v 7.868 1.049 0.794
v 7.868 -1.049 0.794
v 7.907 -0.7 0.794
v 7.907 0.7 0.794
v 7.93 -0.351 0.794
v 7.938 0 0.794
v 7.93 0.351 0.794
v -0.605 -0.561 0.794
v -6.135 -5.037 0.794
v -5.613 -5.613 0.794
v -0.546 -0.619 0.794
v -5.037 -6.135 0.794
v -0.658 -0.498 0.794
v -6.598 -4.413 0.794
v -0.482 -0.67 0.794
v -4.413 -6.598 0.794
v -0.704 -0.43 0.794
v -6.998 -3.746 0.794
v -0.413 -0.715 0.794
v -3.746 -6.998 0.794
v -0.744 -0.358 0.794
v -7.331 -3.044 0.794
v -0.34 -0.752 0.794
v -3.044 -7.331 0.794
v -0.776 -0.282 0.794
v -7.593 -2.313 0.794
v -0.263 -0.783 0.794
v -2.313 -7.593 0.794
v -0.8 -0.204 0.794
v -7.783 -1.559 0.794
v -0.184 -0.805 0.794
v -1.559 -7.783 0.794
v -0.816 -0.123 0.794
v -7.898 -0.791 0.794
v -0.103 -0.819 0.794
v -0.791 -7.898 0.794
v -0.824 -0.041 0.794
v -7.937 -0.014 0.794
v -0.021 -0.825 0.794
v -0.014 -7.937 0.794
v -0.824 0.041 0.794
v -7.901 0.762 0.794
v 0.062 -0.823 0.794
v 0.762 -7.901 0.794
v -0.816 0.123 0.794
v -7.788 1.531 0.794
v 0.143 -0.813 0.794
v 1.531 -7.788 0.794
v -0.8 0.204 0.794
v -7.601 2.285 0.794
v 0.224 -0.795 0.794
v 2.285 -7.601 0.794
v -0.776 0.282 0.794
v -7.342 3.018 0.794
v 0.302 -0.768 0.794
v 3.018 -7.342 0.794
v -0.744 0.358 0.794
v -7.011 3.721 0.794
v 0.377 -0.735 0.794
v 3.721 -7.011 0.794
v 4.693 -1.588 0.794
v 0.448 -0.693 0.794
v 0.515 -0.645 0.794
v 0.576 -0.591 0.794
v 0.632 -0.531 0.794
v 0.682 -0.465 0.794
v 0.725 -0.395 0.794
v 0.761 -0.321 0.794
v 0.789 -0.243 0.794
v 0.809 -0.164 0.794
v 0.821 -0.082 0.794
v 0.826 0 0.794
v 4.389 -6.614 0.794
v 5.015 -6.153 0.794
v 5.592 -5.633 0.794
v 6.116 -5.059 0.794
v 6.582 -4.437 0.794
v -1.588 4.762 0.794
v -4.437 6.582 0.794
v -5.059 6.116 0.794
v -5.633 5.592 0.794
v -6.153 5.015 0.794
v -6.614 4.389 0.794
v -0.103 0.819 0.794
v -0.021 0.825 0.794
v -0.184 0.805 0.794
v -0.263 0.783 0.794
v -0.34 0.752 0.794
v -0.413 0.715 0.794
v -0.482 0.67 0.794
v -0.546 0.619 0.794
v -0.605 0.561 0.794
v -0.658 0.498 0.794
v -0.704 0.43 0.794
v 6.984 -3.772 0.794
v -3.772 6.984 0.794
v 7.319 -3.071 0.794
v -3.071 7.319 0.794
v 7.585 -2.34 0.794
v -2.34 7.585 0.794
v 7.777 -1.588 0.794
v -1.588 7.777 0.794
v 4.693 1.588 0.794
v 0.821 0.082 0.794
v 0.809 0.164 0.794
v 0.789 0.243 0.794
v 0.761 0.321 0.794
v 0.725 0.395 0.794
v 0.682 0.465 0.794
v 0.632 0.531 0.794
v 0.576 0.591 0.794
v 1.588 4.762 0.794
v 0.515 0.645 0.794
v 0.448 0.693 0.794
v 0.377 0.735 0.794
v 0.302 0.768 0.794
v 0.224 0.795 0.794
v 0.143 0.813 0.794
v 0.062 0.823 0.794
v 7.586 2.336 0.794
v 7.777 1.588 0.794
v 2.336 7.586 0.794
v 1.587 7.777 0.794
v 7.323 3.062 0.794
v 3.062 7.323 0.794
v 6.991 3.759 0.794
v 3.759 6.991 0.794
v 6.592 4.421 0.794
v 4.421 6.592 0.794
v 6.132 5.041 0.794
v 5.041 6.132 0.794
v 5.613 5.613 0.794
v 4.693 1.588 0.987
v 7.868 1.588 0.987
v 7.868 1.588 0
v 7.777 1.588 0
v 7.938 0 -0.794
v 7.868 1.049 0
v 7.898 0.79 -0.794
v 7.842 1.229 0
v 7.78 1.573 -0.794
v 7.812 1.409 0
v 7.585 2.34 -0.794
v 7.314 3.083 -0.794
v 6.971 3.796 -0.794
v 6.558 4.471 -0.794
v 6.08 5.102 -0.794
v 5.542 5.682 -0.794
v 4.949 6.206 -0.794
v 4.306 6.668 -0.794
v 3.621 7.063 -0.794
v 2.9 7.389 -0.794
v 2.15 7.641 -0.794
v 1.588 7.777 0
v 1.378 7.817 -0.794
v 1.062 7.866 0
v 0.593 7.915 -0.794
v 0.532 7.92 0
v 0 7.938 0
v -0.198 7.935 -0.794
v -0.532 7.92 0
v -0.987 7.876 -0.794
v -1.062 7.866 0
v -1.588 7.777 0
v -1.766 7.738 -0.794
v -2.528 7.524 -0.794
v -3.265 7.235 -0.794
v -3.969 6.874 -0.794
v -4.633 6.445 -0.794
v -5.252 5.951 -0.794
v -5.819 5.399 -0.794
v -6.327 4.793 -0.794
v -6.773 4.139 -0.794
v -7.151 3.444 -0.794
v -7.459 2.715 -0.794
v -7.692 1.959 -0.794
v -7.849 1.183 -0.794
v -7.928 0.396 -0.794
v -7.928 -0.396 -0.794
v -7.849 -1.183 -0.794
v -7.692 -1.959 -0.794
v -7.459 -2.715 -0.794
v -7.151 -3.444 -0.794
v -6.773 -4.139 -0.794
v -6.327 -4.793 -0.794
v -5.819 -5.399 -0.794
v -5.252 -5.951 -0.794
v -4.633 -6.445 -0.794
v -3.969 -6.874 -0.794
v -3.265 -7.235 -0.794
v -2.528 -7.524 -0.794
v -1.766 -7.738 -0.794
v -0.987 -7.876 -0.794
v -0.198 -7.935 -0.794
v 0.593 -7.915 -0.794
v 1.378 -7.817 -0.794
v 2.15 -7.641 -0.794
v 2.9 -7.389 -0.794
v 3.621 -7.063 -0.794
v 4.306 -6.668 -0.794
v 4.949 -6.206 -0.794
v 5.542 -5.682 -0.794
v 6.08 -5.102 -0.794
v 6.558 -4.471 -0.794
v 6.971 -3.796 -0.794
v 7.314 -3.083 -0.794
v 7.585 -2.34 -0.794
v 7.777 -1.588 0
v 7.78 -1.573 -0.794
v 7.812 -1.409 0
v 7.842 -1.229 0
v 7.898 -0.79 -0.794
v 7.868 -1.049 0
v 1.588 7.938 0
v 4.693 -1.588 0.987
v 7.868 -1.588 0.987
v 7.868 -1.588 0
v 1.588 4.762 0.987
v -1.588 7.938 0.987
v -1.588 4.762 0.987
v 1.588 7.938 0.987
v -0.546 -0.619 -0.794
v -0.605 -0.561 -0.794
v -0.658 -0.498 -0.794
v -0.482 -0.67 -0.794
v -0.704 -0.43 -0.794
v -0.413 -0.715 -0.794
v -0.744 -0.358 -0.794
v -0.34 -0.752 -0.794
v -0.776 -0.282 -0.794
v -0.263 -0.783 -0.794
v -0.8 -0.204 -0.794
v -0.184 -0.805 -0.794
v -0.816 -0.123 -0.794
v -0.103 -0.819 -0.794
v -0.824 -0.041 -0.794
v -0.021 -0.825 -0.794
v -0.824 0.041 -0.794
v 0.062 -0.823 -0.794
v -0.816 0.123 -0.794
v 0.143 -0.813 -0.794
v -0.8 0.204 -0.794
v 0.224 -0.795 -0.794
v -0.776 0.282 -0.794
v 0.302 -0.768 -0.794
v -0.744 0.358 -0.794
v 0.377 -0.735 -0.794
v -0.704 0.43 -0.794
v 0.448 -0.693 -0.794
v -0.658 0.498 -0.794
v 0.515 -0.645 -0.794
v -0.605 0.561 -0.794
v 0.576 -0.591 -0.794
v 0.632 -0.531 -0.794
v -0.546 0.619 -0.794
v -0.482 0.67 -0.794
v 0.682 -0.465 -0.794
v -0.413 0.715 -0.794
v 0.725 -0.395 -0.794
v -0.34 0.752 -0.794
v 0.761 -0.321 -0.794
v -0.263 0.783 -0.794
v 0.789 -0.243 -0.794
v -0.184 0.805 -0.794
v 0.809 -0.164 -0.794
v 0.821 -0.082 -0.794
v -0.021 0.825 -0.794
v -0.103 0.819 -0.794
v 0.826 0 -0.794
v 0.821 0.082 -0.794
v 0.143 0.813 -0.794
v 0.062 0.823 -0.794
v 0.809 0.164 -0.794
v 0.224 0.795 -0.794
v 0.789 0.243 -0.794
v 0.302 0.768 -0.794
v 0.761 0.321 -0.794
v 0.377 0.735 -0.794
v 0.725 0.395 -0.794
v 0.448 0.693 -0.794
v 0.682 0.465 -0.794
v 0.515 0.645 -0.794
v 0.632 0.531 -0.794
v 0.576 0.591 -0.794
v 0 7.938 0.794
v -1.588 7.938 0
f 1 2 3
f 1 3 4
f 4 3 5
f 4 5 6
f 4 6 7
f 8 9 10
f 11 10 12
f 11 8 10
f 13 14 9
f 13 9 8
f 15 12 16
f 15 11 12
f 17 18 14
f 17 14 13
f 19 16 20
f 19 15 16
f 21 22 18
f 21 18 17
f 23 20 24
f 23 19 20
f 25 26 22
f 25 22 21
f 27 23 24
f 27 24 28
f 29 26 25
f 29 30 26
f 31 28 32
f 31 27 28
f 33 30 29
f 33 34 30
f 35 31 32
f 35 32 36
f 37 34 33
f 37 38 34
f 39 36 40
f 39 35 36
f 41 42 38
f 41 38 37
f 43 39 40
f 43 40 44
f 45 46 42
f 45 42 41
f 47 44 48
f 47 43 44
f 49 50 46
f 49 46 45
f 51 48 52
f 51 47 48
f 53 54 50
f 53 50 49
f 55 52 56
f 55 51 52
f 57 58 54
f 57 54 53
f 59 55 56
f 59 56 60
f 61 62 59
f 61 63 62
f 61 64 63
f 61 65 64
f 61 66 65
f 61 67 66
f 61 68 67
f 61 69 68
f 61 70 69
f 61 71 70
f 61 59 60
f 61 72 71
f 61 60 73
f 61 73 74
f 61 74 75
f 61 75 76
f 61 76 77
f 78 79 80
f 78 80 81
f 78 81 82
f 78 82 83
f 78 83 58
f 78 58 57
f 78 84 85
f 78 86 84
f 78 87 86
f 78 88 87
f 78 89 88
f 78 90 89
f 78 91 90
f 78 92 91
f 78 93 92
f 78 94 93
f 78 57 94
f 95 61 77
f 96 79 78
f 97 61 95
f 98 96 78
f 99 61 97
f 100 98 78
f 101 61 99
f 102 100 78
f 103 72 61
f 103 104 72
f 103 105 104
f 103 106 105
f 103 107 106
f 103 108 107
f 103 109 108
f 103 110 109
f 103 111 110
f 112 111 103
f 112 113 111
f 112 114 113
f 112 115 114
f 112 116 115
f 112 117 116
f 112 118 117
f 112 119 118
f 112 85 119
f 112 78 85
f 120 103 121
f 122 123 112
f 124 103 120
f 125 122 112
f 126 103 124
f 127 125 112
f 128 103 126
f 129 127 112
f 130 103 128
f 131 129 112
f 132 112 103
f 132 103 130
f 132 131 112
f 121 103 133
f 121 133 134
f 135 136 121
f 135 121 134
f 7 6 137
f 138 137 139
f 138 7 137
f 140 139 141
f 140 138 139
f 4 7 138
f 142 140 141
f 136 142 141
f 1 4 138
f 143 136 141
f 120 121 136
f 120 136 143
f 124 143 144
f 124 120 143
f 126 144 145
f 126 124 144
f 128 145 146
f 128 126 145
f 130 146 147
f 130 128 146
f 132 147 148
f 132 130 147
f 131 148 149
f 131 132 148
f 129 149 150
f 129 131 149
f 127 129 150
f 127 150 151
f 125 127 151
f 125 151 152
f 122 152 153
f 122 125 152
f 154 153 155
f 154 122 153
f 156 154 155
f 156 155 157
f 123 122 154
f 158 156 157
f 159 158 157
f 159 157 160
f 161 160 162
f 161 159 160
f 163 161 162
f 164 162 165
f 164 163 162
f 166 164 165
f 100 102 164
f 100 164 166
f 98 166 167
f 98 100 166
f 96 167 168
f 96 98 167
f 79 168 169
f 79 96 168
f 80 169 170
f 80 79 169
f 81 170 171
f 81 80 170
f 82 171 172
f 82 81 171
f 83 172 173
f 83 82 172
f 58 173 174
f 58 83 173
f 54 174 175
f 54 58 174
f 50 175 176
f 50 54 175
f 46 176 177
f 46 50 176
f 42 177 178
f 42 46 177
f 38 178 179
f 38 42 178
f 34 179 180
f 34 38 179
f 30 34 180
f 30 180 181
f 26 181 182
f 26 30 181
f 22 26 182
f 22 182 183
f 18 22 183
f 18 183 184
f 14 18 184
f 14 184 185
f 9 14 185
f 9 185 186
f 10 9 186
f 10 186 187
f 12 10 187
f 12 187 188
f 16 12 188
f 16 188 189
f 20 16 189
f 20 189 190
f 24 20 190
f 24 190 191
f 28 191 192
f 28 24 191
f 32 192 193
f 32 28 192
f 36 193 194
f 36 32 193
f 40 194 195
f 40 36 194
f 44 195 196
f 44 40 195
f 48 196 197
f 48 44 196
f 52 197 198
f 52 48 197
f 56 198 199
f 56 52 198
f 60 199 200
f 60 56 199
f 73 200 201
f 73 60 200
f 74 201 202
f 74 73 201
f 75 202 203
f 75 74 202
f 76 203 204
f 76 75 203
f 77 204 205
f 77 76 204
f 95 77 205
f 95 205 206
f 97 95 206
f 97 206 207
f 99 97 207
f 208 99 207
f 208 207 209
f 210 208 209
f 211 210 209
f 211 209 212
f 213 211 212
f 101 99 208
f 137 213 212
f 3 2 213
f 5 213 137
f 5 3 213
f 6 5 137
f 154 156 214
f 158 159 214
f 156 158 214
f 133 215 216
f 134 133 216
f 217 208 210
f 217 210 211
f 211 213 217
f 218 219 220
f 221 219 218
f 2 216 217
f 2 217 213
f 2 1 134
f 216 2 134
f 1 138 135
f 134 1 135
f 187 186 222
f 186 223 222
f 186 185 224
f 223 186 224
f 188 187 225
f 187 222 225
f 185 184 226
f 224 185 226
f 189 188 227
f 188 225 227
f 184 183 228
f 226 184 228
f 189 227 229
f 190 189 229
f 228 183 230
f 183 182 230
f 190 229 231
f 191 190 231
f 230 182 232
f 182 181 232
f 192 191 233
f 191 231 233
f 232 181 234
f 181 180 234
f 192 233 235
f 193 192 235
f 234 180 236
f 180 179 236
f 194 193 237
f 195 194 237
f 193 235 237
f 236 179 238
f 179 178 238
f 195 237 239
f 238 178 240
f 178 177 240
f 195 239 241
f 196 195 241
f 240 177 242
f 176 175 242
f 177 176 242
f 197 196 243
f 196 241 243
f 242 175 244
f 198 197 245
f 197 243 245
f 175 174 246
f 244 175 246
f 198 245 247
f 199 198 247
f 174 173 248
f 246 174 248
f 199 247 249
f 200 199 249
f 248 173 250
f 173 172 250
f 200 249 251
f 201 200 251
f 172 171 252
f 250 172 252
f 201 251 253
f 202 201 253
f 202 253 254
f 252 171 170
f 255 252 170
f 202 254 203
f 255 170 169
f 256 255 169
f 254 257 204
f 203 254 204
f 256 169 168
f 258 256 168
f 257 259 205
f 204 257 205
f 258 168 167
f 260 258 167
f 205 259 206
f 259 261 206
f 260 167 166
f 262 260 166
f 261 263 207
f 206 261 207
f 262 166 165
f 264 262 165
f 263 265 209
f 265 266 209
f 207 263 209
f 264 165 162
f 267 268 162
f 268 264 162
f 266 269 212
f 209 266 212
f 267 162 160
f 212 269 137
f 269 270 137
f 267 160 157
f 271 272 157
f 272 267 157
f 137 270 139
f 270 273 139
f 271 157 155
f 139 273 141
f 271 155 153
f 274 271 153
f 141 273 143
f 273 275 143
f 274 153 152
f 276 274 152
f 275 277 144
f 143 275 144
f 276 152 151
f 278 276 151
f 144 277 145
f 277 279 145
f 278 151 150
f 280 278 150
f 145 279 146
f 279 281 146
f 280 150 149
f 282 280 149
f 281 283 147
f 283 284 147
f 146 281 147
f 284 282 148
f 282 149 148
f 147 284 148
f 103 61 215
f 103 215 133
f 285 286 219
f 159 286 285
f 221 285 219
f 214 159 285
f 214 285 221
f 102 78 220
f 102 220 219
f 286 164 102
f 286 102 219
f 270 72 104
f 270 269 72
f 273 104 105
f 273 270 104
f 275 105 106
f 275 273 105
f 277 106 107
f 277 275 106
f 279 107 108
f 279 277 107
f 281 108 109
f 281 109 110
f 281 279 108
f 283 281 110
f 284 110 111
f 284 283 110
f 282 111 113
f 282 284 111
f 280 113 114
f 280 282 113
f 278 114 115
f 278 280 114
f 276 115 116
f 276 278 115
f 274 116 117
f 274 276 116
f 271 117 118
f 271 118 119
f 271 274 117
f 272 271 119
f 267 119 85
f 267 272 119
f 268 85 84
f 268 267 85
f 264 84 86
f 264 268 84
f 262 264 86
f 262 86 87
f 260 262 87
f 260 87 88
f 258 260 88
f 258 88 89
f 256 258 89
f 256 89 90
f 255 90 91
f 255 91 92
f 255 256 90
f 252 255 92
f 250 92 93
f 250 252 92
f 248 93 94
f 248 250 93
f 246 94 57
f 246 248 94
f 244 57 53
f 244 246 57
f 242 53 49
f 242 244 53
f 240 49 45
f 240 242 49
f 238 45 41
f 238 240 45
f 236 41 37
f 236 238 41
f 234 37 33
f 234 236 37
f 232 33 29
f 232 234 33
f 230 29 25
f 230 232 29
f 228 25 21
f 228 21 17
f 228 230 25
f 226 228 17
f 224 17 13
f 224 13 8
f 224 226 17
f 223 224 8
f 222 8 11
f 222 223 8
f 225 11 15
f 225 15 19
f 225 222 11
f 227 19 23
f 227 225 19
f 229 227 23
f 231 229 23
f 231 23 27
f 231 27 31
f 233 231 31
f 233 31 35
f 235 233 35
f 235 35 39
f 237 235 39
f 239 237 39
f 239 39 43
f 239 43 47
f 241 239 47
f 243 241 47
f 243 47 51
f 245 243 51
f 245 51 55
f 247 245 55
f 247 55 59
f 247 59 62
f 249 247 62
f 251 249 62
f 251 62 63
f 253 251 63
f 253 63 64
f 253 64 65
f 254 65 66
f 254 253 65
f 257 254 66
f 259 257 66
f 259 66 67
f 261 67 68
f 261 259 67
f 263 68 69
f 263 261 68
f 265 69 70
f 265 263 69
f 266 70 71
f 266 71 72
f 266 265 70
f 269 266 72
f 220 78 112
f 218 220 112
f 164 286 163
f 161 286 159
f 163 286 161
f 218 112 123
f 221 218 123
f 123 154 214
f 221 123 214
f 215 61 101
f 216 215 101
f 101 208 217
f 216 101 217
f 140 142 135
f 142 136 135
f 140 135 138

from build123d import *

# Parameters (mm, degrees)
F0_R     = 7.9375
F0_R_2   = 0.8255
F1_DEPTH = 0.79375
F2_W     = 3.175
F2_H     = 3.175
F3_DEPTH = 0.9871898219
F4_W     = 3.175
F4_H     = 3.175
F5_DEPTH = 0.987298


with BuildPart() as f1:
    # F0 (on Top) → F1 (new body, symmetric)
    with BuildSketch(Plane.XY):
        Circle(F0_R)
        Circle(F0_R_2, mode=Mode.SUBTRACT)
    extrude(amount=F1_DEPTH, both=True)

    # F2 (on Top) → F3 (join)
    with BuildSketch(Plane.XY):
        with Locations((0, 6.35)):
            Rectangle(F2_W, F2_H)
    extrude(amount=F3_DEPTH)

    # F4 (on Top) → F5 (join)
    with BuildSketch(Plane.XY):
        with Locations((6.2804043693, 0)):
            Rectangle(F4_W, F4_H)
    extrude(amount=F5_DEPTH)


solid = f1.part
